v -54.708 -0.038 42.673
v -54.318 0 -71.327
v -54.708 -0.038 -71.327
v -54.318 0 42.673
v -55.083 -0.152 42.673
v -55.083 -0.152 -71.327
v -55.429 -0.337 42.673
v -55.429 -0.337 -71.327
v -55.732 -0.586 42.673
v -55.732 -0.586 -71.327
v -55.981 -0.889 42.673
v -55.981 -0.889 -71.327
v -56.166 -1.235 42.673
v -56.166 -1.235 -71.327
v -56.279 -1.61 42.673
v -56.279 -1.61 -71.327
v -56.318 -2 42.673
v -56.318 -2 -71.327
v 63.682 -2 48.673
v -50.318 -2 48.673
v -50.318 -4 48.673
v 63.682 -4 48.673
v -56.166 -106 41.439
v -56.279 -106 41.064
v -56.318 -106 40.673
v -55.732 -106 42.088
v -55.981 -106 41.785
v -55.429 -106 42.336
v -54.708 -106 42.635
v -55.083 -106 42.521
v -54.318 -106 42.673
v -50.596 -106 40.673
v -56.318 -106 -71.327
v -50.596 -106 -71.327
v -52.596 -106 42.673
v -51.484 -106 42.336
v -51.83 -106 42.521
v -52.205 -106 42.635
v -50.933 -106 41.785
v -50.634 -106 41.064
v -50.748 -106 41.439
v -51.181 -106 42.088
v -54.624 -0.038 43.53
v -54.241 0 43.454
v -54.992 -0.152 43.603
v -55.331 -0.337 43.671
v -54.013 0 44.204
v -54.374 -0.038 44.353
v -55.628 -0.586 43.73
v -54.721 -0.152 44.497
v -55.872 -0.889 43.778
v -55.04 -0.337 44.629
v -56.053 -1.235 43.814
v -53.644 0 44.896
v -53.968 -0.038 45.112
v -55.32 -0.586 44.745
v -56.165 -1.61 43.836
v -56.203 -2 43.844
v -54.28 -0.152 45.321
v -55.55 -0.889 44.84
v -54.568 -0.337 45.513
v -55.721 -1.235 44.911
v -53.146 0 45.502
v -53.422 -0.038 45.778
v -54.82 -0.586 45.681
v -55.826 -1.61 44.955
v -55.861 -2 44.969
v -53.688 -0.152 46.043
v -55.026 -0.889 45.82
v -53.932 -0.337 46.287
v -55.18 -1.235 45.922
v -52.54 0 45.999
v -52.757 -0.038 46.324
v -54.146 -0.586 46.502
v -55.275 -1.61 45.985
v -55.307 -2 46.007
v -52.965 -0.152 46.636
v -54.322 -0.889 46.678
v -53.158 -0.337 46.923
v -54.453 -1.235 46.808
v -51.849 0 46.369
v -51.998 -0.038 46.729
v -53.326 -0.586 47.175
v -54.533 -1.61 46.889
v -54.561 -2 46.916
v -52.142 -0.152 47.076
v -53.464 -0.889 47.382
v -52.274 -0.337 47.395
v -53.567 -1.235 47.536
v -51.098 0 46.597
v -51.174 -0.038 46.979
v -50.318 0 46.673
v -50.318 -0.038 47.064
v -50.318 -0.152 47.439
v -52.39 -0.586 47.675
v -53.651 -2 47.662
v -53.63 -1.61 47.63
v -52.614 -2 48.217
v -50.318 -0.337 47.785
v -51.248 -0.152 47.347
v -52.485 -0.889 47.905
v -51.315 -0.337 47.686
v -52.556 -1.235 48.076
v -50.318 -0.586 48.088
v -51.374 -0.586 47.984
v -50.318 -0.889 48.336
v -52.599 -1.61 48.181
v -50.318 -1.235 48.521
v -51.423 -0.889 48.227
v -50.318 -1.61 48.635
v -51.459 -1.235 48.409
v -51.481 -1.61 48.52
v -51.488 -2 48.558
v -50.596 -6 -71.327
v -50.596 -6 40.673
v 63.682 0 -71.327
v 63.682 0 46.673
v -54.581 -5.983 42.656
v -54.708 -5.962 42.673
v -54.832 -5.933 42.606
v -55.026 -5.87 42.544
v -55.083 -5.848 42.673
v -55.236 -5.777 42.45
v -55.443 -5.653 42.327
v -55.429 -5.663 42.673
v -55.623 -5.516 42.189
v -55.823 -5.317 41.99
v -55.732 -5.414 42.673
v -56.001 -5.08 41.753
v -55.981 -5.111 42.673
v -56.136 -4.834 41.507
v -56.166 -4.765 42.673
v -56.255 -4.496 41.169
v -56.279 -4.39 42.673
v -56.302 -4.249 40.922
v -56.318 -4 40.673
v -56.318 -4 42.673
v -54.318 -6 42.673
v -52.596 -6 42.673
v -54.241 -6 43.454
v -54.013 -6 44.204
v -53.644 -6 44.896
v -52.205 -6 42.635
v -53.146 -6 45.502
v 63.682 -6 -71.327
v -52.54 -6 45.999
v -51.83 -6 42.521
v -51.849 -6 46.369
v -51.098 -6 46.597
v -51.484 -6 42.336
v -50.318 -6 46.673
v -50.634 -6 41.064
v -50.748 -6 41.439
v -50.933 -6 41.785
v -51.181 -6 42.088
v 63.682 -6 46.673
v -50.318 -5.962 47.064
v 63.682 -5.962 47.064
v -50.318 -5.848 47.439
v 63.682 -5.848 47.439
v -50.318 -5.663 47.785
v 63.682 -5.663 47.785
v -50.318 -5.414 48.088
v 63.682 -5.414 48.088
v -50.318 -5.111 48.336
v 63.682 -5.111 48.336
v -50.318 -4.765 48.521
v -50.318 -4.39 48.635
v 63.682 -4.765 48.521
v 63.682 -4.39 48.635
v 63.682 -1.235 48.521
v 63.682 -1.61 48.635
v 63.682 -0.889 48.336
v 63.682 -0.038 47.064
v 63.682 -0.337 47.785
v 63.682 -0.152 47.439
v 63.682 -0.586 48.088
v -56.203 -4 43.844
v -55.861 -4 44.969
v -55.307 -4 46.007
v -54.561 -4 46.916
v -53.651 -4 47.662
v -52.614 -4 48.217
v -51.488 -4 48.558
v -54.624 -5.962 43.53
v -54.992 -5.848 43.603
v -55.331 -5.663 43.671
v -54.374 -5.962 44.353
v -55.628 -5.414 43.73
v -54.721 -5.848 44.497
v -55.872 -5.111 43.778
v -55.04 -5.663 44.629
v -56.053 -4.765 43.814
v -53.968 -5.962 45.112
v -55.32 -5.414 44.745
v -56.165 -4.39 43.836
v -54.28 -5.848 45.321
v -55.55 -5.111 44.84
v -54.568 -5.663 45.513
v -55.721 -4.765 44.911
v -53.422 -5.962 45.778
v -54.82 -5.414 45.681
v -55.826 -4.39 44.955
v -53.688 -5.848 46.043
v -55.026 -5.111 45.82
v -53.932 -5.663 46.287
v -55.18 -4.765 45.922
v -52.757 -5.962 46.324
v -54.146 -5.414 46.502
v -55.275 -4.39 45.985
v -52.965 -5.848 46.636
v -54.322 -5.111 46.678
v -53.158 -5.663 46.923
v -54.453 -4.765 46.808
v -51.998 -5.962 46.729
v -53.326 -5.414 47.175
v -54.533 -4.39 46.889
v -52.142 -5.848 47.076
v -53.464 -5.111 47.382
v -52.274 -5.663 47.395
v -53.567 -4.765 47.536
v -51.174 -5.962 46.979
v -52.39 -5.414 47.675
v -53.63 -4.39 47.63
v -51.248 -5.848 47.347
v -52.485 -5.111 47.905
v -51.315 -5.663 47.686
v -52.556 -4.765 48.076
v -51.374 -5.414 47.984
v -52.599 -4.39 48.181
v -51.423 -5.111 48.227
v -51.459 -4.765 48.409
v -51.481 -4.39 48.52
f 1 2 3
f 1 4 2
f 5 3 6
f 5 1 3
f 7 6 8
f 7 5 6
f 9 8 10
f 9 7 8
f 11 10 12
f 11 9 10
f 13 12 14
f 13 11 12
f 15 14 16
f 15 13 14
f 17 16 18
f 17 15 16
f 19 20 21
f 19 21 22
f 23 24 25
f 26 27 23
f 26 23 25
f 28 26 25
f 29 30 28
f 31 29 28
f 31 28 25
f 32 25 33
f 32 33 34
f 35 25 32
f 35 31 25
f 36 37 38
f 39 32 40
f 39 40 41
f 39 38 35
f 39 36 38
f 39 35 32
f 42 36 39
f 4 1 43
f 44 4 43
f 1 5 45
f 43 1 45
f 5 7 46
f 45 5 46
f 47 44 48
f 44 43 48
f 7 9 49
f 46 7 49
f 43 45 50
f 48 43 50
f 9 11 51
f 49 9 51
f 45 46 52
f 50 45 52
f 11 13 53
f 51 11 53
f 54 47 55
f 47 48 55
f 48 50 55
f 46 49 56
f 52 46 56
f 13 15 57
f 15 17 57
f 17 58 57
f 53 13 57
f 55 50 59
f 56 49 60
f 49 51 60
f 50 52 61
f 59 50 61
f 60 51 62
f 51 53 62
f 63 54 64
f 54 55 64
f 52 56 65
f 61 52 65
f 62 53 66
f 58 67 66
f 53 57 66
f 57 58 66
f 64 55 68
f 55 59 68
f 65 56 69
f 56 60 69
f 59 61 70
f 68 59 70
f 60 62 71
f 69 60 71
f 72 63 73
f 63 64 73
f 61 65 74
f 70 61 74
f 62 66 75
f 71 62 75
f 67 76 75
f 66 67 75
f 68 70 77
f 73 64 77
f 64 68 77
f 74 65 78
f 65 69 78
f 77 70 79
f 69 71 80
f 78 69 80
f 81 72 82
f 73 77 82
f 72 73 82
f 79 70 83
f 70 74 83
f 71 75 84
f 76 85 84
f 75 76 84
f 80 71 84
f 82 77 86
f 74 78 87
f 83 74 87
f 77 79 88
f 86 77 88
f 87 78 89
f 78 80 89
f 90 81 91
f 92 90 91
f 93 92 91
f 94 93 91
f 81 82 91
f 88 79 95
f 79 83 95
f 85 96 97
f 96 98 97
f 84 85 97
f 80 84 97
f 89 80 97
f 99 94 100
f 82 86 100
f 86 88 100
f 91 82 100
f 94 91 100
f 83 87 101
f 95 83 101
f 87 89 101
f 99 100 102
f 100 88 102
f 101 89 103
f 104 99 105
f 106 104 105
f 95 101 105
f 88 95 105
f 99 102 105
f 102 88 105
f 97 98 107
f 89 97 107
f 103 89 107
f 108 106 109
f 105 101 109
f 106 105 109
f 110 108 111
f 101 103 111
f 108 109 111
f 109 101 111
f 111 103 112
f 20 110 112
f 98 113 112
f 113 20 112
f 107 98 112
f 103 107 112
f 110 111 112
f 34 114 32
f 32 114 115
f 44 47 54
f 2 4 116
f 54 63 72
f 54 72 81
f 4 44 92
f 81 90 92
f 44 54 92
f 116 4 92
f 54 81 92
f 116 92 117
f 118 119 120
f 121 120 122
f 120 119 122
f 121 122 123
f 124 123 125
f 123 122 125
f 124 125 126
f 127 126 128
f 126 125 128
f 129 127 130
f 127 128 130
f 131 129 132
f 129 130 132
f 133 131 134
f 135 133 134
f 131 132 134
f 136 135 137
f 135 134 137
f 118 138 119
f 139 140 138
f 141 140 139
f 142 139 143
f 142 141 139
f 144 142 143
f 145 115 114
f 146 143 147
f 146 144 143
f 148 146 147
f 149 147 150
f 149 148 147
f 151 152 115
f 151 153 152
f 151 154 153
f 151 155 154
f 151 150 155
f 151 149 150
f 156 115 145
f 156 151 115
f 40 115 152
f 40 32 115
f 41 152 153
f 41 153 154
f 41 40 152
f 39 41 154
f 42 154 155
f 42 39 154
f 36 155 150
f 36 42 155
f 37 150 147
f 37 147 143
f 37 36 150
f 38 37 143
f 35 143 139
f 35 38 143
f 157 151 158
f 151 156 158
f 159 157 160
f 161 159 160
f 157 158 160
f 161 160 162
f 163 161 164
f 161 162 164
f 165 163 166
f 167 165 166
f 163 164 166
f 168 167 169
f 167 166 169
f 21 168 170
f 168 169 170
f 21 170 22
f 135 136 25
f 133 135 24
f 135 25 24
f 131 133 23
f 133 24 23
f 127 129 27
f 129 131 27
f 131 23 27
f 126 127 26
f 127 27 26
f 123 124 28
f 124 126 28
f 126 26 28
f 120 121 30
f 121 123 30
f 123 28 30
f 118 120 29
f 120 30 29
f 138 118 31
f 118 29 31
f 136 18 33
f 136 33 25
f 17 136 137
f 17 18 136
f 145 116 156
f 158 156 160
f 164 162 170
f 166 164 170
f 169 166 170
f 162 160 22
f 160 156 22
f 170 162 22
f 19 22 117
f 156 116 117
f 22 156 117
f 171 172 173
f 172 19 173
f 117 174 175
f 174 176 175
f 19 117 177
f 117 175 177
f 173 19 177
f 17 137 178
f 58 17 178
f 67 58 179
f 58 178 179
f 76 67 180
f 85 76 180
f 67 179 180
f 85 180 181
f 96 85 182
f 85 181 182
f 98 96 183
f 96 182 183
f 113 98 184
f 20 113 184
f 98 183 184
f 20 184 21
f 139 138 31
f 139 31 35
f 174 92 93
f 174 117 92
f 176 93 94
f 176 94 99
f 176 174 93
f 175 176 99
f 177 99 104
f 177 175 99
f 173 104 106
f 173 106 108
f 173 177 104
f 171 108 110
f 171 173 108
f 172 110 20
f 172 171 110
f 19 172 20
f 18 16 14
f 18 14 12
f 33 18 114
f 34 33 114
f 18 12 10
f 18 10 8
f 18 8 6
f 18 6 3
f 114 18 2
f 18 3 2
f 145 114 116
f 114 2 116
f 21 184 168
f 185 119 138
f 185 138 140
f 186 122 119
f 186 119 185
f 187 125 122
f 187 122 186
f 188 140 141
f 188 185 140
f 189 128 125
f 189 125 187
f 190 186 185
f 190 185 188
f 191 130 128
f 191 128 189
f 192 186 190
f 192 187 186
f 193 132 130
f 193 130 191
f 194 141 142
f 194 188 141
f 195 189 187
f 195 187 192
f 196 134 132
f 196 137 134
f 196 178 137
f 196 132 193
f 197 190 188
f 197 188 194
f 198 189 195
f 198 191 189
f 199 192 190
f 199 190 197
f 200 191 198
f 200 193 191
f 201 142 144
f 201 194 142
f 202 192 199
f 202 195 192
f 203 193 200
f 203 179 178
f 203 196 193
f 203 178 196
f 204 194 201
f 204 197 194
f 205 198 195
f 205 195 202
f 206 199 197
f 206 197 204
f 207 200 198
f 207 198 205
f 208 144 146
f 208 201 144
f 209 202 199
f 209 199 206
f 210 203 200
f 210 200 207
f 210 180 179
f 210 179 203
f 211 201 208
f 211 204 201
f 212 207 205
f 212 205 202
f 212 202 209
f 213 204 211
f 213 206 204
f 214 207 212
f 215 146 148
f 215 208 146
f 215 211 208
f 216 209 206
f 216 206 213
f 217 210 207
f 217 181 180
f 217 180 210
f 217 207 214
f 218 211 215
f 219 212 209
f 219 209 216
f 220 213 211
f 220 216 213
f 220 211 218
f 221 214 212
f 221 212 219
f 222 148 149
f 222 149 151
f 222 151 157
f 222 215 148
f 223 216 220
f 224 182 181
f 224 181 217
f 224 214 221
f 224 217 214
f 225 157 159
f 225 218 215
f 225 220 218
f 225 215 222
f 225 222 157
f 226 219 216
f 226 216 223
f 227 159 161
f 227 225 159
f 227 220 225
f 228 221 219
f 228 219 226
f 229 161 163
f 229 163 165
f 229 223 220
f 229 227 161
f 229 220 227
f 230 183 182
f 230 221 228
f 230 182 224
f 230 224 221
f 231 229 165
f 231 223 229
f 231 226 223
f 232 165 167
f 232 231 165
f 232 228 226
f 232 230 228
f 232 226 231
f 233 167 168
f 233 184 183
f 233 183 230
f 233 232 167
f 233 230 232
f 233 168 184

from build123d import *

# Parameters (mm, degrees)
F0_W     = 120
F0_H     = 120
F1_DEPTH = 6
F2_R     = 6
F3_W     = 5.722270757
F3_H     = 114
F4_DEPTH = 100
F5_R     = 2
F6_R     = 1.99999


# Not quite as in the source:
# - a fillet or chamfer is up to 0.001 mm smaller than in the source, because OpenCascade refuses the exact size


with BuildPart() as f1:
    # F0 (on Front) → F1 (new body)
    with BuildSketch(Plane.XZ):
        with Locations((3.6820918322, -11.3266304067)):
            Rectangle(F0_W, F0_H)
    extrude(amount=F1_DEPTH)

    # F2
    f2_edges = [f1.edges().sort_by_distance(p)[0] for p in [
        (-56.317908, -3, 48.67337),
    ]]
    fillet(f2_edges, radius=F2_R)

    # F3 (on face) → F4 (join)
    with BuildSketch(Plane.XZ.offset(6)):
        with Locations((-53.4567727894, -14.3266304067)):
            Rectangle(F3_W, F3_H)
    extrude(amount=F4_DEPTH)

    # F5
    f5_edges = [f1.edges().sort_by_distance(p)[0] for p in [
        (-56.317908, -56, 42.67337),
        (-50.595637, -56, 42.67337),
    ]]
    fillet(f5_edges, radius=F5_R)

    # F6 (radius 2 in the source; OpenCascade refuses exactly that, so slightly less here)
    f6_edges = [f1.edges().sort_by_distance(p)[0] for p in [
        (6.682092, -6, 48.67337),
        (6.682092, 0, 48.67337),
    ]]
    fillet(f6_edges, radius=F6_R)


solid = f1.part
